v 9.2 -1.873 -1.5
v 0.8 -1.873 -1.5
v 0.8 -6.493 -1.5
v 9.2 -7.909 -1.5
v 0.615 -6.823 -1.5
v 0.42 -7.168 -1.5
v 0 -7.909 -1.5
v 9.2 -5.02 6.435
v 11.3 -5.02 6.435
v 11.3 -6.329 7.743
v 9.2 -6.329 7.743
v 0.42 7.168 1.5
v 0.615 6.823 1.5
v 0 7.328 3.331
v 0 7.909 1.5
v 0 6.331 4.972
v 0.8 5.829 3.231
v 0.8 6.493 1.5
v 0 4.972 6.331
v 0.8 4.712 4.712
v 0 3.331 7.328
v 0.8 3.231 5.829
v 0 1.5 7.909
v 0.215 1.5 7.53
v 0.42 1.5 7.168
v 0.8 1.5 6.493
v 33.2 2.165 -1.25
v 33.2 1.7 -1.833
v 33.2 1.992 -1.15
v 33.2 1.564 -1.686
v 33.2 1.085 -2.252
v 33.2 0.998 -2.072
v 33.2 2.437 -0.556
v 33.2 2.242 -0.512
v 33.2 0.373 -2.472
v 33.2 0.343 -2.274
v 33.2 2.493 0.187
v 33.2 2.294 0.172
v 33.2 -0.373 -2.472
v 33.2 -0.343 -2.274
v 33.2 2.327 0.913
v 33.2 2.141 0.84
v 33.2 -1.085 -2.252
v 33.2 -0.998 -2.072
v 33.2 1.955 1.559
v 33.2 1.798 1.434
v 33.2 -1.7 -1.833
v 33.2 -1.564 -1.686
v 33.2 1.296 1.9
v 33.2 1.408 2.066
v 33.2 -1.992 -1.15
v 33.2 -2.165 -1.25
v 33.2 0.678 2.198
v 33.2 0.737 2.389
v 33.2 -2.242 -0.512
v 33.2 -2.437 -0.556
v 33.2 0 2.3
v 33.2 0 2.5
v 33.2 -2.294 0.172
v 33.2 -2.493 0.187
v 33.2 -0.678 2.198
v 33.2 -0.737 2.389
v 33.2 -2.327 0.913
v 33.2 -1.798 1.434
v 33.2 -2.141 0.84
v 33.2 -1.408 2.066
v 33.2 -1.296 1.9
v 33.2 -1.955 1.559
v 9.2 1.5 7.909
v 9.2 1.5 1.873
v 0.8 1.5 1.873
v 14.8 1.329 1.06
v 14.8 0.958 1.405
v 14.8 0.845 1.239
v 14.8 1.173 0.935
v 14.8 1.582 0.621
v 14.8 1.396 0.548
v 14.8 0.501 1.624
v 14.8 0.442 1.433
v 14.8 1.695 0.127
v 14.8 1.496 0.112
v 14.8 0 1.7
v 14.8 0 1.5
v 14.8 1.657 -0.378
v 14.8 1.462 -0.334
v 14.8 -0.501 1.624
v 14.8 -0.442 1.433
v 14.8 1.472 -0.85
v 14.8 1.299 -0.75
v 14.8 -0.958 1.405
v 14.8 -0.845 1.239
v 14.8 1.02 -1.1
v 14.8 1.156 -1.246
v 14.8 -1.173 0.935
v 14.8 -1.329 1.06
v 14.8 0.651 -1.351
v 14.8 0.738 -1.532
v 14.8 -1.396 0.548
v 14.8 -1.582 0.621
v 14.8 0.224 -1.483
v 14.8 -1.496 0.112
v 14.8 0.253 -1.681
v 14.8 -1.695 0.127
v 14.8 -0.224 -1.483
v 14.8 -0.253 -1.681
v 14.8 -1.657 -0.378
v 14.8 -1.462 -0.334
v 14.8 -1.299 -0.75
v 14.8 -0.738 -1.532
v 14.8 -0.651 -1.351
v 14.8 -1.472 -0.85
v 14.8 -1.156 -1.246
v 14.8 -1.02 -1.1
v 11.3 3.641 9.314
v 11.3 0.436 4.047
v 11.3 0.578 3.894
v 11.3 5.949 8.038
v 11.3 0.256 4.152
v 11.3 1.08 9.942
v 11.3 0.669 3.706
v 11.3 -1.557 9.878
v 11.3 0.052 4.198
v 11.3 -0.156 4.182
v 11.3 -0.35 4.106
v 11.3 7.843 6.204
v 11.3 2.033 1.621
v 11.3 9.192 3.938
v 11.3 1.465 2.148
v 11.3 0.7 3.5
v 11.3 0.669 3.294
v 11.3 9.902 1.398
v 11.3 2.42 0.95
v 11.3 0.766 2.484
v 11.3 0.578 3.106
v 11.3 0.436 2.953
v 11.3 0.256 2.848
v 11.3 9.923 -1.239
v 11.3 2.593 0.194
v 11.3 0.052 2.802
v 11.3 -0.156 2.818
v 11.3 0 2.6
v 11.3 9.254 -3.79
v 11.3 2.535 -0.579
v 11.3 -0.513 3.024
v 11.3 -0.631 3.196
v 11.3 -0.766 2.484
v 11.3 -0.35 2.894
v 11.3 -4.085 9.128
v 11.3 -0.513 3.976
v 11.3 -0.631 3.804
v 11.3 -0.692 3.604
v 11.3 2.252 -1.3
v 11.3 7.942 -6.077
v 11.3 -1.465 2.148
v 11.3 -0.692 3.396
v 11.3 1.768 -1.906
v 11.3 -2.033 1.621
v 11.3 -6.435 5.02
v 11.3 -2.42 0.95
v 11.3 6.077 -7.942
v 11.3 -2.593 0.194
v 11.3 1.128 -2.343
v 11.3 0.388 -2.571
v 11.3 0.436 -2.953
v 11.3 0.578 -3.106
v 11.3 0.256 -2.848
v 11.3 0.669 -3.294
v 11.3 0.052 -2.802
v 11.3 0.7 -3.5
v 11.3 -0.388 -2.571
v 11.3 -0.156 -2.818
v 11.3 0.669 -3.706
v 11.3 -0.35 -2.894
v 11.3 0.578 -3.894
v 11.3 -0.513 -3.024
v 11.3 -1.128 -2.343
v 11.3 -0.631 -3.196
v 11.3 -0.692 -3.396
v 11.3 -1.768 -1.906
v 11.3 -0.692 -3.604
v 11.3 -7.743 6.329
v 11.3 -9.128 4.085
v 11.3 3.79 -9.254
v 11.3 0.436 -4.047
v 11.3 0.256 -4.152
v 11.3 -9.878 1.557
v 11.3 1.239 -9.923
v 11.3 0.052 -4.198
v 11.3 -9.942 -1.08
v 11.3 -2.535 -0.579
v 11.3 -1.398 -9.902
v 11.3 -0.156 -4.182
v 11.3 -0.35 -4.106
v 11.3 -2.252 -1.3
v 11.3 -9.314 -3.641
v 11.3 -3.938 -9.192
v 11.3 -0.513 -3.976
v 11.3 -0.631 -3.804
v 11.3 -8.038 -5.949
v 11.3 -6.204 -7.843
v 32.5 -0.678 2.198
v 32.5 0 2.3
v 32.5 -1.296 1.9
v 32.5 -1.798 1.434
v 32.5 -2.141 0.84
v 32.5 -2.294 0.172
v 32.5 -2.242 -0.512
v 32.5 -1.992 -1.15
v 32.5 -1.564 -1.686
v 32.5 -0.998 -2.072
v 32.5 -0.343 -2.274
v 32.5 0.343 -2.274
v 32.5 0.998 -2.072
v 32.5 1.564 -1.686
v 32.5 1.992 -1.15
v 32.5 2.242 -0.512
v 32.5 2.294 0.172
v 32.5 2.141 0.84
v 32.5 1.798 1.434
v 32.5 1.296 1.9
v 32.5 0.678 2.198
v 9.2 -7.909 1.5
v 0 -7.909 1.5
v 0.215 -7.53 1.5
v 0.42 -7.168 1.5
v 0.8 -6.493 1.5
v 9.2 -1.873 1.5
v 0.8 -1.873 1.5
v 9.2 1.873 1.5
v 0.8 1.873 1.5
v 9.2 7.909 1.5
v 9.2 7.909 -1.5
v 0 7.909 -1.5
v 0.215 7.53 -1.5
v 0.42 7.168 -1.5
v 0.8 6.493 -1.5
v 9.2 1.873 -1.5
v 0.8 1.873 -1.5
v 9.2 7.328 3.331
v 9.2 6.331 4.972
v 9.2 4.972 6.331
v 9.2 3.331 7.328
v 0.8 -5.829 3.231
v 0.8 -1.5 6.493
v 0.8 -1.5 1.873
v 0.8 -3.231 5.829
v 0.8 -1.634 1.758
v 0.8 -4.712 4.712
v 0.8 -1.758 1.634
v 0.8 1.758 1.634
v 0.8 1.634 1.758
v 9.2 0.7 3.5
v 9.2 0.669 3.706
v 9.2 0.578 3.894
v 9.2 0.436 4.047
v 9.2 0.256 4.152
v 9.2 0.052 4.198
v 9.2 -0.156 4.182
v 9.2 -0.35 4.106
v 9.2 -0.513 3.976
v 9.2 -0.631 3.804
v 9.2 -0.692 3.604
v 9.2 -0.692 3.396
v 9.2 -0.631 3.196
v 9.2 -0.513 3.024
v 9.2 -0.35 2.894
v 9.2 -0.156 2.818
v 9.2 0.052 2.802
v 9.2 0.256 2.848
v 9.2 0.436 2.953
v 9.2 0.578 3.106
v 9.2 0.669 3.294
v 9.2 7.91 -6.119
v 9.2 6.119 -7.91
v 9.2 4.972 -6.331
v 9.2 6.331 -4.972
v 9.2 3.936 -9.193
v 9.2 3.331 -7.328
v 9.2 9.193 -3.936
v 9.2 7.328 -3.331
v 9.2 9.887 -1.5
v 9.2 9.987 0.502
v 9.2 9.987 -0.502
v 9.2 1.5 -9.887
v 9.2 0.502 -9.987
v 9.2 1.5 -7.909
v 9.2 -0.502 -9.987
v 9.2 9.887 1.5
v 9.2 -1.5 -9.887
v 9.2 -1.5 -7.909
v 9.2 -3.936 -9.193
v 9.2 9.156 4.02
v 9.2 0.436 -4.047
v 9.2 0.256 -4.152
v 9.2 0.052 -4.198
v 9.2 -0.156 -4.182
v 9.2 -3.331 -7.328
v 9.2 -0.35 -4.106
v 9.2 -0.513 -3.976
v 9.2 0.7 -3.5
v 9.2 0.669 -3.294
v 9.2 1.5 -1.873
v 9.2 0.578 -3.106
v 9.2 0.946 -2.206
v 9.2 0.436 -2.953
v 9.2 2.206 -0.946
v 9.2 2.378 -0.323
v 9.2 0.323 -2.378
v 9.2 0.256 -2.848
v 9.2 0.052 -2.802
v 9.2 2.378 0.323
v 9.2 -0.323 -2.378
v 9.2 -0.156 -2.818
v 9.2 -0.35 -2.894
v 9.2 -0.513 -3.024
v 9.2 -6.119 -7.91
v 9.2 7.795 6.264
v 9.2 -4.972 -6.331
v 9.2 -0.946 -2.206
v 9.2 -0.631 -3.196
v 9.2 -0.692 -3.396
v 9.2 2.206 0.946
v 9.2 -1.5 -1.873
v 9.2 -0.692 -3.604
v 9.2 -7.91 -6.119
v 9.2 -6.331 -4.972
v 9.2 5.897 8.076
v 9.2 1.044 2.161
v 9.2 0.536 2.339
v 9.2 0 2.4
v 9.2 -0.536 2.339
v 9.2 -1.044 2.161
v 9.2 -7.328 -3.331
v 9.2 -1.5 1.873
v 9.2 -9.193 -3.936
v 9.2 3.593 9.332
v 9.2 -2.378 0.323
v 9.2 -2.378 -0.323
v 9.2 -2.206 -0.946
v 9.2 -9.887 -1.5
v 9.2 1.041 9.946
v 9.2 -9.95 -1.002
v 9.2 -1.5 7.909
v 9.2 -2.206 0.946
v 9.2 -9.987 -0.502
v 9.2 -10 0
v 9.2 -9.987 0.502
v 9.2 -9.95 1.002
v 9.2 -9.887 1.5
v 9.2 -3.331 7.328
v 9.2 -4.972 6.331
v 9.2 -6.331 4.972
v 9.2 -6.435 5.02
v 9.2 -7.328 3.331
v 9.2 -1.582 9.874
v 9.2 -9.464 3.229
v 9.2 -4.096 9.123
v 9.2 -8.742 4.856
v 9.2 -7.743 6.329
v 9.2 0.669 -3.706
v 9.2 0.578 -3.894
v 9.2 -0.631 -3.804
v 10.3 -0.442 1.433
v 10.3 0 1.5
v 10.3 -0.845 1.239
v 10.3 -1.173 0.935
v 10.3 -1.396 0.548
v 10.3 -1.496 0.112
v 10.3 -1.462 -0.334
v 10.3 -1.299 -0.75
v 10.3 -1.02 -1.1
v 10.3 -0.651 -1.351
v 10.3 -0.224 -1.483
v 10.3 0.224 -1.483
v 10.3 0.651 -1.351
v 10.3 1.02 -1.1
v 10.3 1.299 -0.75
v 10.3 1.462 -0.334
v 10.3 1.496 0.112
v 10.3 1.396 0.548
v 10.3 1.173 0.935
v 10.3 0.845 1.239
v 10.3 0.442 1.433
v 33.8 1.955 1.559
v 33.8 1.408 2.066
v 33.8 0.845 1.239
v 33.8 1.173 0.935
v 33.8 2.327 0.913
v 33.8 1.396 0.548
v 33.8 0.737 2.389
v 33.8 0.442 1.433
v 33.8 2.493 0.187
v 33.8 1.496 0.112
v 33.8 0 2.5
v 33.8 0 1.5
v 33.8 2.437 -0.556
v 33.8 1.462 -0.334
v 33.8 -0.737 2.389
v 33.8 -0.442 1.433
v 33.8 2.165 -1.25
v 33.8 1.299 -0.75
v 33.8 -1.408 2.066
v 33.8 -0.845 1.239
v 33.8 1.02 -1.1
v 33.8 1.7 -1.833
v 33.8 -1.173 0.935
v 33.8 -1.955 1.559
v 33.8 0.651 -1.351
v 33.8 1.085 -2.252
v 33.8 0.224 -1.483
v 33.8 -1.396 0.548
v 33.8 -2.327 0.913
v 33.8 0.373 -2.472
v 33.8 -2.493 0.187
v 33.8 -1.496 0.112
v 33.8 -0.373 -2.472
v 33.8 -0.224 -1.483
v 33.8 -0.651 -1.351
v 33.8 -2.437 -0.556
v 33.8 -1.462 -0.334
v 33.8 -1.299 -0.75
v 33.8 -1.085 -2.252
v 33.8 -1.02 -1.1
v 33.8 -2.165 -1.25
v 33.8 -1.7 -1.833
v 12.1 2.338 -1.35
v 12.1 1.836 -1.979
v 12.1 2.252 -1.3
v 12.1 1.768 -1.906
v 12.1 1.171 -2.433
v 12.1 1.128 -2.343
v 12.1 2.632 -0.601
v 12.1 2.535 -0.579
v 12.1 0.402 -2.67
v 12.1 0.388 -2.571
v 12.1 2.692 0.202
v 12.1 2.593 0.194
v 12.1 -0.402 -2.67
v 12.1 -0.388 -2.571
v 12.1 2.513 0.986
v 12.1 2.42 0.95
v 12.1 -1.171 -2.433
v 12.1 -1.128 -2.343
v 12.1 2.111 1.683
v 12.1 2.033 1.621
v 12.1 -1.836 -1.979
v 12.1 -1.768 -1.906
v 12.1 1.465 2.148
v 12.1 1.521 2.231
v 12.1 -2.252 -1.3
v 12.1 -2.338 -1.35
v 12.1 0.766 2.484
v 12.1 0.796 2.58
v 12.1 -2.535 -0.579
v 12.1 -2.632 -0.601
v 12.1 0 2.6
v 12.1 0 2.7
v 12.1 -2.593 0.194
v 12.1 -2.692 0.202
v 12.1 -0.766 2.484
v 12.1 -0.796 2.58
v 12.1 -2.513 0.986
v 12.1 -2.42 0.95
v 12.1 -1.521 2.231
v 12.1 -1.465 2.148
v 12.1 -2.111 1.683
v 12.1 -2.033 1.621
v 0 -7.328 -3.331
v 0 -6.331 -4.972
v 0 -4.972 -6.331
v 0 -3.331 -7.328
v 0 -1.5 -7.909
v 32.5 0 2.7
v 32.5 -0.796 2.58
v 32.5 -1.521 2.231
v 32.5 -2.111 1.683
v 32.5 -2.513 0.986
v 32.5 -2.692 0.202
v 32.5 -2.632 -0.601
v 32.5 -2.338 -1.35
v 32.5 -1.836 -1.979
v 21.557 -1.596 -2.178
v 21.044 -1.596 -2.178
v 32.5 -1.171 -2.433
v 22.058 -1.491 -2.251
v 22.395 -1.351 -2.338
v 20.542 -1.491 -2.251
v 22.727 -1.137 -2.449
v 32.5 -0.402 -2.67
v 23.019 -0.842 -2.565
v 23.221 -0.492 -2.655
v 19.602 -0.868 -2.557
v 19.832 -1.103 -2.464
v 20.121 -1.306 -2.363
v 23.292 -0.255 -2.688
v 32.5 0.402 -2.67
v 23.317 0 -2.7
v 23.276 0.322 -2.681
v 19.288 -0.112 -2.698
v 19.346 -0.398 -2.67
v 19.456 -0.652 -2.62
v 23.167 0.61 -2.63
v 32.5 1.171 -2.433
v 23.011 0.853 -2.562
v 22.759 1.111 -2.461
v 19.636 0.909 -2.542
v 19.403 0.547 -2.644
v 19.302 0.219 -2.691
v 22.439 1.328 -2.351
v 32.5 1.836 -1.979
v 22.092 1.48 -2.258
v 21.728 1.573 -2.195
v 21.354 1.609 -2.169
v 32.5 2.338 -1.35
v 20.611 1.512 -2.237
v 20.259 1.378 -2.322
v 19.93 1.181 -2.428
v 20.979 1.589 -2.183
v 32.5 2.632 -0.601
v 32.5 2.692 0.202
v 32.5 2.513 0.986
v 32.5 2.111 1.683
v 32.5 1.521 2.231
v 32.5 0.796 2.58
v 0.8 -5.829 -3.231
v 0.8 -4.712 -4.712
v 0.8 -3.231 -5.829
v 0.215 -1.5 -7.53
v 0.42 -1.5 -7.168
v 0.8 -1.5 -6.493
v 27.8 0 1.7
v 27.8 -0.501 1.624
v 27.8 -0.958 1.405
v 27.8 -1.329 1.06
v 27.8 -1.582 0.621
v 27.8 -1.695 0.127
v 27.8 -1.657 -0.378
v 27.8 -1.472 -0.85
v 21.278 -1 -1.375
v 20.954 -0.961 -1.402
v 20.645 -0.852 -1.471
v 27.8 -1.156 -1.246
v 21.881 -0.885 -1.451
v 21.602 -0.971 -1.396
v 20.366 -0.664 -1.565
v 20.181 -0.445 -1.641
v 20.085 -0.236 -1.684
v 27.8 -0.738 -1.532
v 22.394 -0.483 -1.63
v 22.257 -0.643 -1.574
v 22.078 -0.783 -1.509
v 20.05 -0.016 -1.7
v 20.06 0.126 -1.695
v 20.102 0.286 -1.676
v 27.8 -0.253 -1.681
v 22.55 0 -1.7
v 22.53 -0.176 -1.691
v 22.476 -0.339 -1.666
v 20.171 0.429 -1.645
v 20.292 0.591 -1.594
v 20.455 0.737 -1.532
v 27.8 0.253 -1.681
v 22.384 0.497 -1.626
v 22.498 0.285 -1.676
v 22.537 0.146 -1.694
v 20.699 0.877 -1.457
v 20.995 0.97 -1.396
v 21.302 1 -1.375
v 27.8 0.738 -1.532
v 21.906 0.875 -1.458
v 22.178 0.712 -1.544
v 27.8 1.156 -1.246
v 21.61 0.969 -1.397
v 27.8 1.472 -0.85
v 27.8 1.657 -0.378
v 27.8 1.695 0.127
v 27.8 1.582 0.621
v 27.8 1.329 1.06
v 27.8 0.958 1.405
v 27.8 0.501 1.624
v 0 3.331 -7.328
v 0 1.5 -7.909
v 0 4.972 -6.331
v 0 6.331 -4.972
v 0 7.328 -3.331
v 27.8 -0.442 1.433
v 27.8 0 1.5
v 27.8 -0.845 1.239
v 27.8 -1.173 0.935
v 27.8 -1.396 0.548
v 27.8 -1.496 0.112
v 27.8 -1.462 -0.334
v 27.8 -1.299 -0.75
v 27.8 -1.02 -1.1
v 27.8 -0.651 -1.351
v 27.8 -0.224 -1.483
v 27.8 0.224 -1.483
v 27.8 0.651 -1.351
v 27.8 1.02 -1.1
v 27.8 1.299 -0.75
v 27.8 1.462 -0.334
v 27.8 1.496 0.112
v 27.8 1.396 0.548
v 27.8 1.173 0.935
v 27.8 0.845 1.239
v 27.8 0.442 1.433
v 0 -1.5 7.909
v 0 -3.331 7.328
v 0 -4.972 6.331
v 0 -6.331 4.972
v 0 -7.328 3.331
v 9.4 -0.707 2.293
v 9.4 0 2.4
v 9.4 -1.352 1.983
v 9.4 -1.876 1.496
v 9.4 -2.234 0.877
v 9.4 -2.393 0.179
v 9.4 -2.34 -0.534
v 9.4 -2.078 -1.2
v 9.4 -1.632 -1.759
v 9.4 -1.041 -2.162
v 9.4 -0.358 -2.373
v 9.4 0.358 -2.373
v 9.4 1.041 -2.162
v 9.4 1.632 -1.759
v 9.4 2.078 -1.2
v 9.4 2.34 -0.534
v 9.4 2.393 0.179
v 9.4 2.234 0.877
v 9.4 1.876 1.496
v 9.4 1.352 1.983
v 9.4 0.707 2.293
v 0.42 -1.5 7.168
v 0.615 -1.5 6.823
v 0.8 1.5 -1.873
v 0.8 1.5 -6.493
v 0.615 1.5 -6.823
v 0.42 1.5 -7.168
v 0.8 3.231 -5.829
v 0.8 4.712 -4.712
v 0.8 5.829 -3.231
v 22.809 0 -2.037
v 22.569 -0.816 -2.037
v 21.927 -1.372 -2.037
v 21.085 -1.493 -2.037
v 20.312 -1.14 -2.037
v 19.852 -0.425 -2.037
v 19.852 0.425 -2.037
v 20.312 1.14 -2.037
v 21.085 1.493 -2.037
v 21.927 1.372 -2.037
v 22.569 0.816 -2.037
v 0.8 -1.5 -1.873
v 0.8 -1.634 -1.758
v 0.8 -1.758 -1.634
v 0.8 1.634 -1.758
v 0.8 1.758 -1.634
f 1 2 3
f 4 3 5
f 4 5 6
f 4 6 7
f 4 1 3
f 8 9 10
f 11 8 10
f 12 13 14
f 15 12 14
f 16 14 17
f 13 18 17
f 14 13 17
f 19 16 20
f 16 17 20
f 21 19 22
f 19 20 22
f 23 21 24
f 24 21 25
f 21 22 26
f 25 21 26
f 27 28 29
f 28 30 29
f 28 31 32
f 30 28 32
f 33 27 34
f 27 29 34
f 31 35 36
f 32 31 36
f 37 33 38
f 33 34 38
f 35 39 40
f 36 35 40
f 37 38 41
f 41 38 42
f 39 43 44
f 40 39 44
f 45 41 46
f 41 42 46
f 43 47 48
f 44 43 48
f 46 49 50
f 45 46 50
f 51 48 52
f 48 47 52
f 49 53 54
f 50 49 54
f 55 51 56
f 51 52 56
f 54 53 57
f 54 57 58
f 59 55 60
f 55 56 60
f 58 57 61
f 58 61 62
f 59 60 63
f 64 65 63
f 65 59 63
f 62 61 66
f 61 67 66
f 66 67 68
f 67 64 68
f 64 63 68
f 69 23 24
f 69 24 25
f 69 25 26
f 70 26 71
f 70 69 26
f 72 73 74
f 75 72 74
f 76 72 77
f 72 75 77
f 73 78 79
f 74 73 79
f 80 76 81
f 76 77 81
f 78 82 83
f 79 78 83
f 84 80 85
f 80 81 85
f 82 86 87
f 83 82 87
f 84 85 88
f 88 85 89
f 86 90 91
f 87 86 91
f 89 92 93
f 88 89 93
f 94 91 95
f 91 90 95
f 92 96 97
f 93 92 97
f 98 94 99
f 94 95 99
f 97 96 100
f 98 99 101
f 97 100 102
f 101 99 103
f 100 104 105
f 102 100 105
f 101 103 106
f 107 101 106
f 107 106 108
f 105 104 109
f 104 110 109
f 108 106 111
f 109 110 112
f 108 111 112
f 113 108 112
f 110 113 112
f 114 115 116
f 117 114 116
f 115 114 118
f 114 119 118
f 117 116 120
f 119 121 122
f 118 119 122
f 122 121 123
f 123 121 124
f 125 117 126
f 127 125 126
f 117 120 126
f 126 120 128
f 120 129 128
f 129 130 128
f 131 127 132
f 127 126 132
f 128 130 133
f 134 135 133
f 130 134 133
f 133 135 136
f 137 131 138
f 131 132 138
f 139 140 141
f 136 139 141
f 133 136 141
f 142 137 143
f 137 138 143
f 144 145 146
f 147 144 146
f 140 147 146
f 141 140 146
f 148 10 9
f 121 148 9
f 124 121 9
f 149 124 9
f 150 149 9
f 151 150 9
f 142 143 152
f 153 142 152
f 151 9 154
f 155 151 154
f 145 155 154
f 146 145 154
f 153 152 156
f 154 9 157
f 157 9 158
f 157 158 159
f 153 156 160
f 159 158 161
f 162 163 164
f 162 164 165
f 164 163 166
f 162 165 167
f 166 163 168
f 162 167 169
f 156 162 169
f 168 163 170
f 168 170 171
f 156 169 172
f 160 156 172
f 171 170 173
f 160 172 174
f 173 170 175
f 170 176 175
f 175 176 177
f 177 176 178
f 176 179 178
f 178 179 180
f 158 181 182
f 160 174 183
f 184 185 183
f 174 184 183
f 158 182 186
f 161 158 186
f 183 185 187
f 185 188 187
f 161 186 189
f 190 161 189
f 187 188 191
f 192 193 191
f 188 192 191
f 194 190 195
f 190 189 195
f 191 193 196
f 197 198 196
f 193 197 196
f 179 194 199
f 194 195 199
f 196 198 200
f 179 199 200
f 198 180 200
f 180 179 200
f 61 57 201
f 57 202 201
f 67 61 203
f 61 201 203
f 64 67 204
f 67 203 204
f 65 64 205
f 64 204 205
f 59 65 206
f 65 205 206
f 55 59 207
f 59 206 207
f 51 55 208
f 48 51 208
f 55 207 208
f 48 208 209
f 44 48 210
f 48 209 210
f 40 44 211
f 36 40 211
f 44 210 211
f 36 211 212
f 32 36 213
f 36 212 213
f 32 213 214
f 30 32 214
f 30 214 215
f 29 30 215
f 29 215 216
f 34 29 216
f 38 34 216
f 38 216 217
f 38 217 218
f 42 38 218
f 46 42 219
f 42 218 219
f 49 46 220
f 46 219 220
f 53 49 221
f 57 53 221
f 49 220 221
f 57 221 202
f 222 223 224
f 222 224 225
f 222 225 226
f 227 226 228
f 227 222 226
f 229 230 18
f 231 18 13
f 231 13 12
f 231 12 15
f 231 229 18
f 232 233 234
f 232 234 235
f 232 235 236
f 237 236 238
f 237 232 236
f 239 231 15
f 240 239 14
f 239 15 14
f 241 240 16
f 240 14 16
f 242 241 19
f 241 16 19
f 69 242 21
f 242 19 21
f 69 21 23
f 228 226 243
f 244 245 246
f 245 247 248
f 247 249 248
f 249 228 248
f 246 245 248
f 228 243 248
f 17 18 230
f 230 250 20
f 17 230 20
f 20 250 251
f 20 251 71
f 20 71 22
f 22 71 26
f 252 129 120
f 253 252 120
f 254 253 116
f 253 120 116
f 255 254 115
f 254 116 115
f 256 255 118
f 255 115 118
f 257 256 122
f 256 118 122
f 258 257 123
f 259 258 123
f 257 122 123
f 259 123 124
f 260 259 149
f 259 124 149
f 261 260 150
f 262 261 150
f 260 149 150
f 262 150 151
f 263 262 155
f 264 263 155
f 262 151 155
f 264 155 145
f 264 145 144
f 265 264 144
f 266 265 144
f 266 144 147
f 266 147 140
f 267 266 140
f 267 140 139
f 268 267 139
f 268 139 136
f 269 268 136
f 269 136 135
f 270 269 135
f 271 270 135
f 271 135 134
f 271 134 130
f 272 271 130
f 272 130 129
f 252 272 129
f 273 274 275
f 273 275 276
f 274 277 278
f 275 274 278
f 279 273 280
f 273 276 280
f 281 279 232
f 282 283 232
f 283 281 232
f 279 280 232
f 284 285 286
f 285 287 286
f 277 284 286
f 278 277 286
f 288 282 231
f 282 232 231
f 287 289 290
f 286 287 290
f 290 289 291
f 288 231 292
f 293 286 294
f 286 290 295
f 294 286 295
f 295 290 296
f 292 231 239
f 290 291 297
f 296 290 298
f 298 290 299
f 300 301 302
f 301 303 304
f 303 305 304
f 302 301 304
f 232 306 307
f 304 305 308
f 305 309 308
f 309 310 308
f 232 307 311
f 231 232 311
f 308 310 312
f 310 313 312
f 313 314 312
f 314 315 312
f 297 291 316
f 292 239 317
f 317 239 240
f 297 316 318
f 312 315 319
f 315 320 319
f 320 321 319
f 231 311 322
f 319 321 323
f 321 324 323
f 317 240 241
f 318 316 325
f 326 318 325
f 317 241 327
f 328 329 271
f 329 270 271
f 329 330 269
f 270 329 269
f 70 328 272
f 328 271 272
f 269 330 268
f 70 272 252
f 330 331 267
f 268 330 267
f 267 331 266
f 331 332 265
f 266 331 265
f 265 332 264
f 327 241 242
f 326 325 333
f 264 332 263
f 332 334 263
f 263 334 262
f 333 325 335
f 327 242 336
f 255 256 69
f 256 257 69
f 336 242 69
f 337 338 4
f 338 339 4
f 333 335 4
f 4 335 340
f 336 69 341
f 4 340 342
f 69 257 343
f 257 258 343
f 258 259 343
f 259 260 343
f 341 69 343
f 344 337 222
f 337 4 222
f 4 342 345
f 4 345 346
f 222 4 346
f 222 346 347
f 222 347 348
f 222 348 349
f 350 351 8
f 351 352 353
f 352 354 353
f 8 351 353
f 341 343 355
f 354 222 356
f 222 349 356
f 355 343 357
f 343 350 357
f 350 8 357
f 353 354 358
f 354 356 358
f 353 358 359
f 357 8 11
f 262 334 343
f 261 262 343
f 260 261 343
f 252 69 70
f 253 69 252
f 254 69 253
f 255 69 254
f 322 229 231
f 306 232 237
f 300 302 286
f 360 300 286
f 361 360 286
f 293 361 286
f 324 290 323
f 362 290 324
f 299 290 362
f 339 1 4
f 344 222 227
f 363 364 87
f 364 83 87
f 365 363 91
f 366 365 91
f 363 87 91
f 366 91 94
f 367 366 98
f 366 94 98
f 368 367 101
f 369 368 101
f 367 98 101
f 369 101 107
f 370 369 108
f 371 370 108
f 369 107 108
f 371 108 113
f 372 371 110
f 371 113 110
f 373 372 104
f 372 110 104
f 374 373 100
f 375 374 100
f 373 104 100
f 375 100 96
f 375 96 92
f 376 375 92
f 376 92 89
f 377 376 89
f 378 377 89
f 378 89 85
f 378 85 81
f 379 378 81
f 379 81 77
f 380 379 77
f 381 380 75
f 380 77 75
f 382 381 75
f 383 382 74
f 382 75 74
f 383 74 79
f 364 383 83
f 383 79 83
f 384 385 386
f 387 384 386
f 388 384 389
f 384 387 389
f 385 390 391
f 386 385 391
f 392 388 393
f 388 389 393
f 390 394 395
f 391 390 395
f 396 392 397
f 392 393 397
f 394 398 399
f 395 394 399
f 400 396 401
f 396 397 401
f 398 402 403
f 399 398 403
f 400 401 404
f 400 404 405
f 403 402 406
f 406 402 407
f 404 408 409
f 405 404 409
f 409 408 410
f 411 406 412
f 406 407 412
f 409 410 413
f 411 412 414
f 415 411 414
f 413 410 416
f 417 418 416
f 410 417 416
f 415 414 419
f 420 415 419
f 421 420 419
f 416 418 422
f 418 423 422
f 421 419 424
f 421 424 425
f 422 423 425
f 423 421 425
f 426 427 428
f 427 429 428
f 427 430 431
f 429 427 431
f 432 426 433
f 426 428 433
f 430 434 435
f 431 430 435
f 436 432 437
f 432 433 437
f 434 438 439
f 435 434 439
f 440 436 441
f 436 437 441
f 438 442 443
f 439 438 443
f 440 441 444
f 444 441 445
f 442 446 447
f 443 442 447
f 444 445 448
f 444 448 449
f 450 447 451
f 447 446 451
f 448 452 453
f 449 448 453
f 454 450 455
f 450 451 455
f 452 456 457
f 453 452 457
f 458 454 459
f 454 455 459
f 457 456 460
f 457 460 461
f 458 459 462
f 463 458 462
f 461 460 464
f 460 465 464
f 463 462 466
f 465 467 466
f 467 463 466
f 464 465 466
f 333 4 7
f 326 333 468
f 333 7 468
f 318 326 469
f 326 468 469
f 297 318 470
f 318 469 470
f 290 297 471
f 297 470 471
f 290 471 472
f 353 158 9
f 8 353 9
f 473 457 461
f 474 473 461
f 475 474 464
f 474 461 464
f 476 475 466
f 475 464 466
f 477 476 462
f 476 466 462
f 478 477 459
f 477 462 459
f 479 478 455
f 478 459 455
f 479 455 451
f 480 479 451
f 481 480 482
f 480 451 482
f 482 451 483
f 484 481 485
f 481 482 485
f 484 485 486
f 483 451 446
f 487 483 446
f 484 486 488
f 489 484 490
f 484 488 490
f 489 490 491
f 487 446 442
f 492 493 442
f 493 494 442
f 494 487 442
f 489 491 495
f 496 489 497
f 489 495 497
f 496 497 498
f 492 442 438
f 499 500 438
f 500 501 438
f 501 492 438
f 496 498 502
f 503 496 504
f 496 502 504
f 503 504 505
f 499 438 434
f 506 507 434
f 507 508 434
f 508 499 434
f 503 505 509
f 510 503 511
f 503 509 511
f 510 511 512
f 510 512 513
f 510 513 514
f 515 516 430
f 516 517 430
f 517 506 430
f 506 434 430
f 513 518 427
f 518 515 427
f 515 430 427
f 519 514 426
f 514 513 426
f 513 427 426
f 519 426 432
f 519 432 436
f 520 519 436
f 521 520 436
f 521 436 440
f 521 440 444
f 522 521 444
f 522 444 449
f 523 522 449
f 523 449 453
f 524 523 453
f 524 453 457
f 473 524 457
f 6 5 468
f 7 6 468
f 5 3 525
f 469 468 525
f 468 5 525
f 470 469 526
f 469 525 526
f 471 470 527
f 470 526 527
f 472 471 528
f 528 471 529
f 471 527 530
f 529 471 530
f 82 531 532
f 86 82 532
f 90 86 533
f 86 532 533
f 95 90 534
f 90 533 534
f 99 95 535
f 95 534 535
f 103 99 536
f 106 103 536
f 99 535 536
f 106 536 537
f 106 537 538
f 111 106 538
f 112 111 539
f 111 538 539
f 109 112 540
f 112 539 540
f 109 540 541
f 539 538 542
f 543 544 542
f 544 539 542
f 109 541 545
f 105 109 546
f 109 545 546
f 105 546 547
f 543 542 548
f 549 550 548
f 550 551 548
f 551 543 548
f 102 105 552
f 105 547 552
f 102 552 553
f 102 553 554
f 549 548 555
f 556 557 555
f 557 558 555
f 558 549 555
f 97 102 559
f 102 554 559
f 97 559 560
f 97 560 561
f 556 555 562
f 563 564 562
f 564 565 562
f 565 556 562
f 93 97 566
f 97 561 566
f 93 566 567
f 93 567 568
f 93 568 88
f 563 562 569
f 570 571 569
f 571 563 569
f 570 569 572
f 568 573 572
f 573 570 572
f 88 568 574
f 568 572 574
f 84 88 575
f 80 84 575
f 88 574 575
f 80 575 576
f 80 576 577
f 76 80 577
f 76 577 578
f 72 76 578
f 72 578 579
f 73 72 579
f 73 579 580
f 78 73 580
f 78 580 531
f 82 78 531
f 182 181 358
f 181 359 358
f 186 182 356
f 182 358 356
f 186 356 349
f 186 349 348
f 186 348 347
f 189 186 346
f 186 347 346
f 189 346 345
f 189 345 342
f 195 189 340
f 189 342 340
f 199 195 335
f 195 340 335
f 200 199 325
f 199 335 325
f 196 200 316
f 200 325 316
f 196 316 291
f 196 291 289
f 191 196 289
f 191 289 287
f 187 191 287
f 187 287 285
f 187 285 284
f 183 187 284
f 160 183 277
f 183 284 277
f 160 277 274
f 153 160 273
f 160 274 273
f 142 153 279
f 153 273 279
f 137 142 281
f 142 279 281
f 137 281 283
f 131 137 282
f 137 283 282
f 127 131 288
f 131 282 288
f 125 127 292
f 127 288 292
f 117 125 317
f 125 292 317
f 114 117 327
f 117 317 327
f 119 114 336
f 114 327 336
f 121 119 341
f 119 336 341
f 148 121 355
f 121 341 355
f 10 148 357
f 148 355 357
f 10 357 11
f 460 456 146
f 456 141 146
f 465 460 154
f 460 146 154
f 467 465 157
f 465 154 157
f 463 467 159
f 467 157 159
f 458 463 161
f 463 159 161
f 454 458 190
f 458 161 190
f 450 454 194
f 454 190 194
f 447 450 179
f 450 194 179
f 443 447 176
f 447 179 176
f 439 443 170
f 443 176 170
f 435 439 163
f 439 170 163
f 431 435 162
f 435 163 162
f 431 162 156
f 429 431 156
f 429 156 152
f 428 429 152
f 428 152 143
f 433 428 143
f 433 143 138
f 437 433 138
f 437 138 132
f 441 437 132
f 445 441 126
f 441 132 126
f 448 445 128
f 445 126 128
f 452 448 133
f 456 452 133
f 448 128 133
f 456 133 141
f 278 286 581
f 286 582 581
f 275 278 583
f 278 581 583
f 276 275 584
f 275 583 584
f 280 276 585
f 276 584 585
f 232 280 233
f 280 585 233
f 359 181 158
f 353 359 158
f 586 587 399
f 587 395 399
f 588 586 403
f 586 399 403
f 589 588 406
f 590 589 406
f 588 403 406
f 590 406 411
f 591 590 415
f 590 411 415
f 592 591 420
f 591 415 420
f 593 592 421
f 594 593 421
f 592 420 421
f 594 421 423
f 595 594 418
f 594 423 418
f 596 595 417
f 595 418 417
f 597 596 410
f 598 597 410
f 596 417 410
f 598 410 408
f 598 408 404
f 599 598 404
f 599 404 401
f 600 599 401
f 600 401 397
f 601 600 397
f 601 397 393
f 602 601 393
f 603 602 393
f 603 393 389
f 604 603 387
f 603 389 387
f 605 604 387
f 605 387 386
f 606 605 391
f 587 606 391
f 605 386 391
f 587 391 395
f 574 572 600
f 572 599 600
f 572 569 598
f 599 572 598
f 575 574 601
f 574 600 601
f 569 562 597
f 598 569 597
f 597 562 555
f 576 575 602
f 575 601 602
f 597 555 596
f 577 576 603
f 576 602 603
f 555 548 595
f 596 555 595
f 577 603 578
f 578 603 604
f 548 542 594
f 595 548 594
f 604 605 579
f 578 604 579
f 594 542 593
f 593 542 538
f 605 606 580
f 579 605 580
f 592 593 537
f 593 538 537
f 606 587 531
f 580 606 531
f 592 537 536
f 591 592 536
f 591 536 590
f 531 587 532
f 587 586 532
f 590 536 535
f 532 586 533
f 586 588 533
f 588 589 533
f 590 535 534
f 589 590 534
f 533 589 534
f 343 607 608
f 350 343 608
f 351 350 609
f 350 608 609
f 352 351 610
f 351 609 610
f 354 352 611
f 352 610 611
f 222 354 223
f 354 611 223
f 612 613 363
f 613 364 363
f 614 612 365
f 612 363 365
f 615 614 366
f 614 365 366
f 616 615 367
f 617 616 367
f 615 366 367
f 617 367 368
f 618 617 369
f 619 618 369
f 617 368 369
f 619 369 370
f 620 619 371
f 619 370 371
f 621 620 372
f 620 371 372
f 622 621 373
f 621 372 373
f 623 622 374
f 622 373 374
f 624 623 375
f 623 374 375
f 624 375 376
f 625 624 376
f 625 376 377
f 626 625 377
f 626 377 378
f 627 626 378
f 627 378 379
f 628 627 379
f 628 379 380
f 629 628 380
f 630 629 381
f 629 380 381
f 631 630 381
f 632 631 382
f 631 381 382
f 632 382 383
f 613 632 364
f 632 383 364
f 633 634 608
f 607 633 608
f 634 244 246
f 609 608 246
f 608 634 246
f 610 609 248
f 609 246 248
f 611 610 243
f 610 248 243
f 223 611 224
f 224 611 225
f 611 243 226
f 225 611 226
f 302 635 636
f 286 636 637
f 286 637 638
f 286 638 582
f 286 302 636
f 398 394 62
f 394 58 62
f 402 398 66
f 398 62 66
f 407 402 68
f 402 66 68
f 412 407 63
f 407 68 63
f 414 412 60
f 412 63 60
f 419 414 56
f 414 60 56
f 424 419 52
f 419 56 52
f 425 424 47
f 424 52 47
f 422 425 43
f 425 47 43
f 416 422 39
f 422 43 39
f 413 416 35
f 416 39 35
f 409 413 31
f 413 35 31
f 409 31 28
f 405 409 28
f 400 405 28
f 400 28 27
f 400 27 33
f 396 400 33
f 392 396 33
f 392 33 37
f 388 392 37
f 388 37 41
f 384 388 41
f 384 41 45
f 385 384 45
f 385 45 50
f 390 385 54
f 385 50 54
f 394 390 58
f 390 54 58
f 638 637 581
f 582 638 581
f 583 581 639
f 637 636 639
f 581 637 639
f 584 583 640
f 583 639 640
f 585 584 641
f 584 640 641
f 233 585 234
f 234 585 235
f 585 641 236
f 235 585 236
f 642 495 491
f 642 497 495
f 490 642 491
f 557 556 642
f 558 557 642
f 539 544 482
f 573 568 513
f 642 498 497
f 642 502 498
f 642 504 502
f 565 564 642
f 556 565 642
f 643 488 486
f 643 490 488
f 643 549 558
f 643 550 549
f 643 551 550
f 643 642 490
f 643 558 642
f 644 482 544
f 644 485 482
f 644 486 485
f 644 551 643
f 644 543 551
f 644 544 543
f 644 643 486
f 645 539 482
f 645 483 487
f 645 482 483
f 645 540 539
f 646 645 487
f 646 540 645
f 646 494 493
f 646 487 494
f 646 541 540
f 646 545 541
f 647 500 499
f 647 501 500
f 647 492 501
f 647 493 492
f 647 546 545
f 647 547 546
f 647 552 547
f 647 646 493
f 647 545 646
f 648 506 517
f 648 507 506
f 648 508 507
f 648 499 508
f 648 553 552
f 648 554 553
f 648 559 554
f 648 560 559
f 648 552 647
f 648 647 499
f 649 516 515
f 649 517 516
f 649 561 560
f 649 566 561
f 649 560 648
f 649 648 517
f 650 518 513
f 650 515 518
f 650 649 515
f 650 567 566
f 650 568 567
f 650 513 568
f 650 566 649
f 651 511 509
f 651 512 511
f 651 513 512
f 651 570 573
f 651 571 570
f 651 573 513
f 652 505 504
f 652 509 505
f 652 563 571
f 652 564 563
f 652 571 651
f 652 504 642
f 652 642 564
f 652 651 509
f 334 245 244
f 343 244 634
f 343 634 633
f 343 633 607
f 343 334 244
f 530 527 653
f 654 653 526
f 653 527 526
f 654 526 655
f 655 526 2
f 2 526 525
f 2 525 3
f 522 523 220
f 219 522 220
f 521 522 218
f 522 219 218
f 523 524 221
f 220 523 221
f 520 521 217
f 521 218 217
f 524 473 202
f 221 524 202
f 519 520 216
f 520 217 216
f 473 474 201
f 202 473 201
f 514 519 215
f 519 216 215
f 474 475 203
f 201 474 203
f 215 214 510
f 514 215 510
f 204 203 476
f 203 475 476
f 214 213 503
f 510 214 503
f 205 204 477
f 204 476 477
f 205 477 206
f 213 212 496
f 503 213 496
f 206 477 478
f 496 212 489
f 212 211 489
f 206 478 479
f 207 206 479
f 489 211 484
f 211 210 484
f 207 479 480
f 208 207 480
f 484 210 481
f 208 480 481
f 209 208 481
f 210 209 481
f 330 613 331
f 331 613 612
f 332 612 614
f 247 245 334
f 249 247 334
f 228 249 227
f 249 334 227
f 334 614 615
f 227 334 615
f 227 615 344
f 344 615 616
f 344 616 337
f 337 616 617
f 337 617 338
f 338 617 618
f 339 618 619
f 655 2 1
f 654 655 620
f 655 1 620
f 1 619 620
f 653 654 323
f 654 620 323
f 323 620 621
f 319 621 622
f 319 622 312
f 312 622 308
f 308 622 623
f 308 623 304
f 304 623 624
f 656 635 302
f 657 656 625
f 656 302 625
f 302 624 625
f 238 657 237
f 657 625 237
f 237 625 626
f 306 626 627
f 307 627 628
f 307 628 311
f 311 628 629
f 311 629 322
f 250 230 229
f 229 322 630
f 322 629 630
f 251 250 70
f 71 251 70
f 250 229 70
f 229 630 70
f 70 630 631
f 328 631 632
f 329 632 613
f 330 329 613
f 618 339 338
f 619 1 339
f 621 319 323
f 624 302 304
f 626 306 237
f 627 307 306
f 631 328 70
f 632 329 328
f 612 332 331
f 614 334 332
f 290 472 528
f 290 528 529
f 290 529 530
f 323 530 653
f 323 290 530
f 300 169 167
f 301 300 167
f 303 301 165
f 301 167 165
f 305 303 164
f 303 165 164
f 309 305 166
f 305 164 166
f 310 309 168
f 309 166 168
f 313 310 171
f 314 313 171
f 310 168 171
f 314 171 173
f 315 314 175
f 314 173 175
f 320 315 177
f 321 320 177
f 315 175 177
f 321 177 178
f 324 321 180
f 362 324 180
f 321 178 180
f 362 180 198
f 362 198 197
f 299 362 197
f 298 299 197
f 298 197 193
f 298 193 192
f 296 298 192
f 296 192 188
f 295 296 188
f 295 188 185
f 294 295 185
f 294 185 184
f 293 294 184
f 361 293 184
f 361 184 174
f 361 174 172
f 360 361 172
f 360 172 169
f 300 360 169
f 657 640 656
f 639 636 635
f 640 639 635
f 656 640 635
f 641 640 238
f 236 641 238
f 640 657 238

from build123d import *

# Parameters (mm, degrees)
F2_W     = 3
F2_H     = 3
F3_DEPTH = 9.201
F4_R     = 0.7
F5_DEPTH = 11.301


with BuildPart() as f1:
    # F0 (on Front) → F1 (revolve)
    with BuildSketch(Plane.XZ):
        Polygon((9.2, 8.05), (0, 8.05), (0.8, 6.6643593539), (0.8, 2.4), (9.4, 2.4), (10.3, 1.5), (14.8, 1.5), (14.8, 1.7), (27.8, 1.7), (27.8, 1.5), (33.8, 1.5), (33.8, 2.5), (33.2, 2.5), (33.2, 2.3), (32.5, 2.3), (32.5, 2.7), (12.1, 2.7), (12.1, 2.6), (11.3, 2.6), (11.3, 10), (9.2, 10), align=None)
    revolve(axis=Axis((16.7398190946, 0, 0), (1, 0, 0)))

    # F2 (on face) → F3 (cut, through all)
    with BuildSketch(Plane(origin=(9.2, 0, 0), x_dir=(0, -1, 0), z_dir=(-1, 0, 0))):
        with BuildLine():
            Line((1.5, 1.5), (1.5, 7.909013845))
            ThreePointArc((1.5, 7.909013845), (0, 8.05), (-1.5, 7.909013845))
            Line((-1.5, 7.909013845), (-1.5, 1.5))
            Line((-1.5, 1.5), (1.5, 1.5))
        make_face()
        with BuildLine():
            Line((1.5, 7.909013845), (1.5, 9.8868599666))
            ThreePointArc((1.5, 9.8868599666), (0, 10), (-1.5, 9.8868599666))
            Line((-1.5, 9.8868599666), (-1.5, 7.909013845))
            ThreePointArc((-1.5, 7.909013845), (0, 8.05), (1.5, 7.909013845))
        make_face()
        with BuildLine():
            Line((-1.5, -1.5), (-1.5, 1.5))
            Line((-1.5, 1.5), (-7.909013845, 1.5))
            ThreePointArc((-7.909013845, 1.5), (-8.05, 0), (-7.909013845, -1.5))
            Line((-7.909013845, -1.5), (-1.5, -1.5))
        make_face()
        with BuildLine():
            Line((-7.909013845, 1.5), (-9.8868599666, 1.5))
            ThreePointArc((-9.8868599666, 1.5), (-10, 0), (-9.8868599666, -1.5))
            Line((-9.8868599666, -1.5), (-7.909013845, -1.5))
            ThreePointArc((-7.909013845, -1.5), (-8.05, 0), (-7.909013845, 1.5))
        make_face()
        Rectangle(F2_W, F2_H)
        with BuildLine():
            ThreePointArc((8.05, 0), (8.0146759589, 0.7533055648), (7.909013845, 1.5))
            Line((7.909013845, 1.5), (1.5, 1.5))
            Line((1.5, 1.5), (1.5, -1.5))
            Line((1.5, -1.5), (7.909013845, -1.5))
            ThreePointArc((7.909013845, -1.5), (8.0146759589, -0.7533055648), (8.05, 0))
        make_face()
        with BuildLine():
            ThreePointArc((9.8868599666, -1.5), (9.971674876, -0.7521304187), (10, 0))
            ThreePointArc((10, 0), (9.971674876, 0.7521304187), (9.8868599666, 1.5))
            Line((9.8868599666, 1.5), (7.909013845, 1.5))
            ThreePointArc((7.909013845, 1.5), (8.0146759589, 0.7533055648), (8.05, 0))
            ThreePointArc((8.05, 0), (8.0146759589, -0.7533055648), (7.909013845, -1.5))
            Line((7.909013845, -1.5), (9.8868599666, -1.5))
        make_face()
        with BuildLine():
            ThreePointArc((-1.5, -7.909013845), (0, -8.05), (1.5, -7.909013845))
            Line((1.5, -7.909013845), (1.5, -1.5))
            Line((1.5, -1.5), (-1.5, -1.5))
            Line((-1.5, -1.5), (-1.5, -7.909013845))
        make_face()
        with BuildLine():
            ThreePointArc((-1.5, -9.8868599666), (0, -10), (1.5, -9.8868599666))
            Line((1.5, -9.8868599666), (1.5, -7.909013845))
            ThreePointArc((1.5, -7.909013845), (0, -8.05), (-1.5, -7.909013845))
            Line((-1.5, -7.909013845), (-1.5, -9.8868599666))
        make_face()
    extrude(amount=F3_DEPTH, mode=Mode.SUBTRACT)

    # F4 (on face) → F5 (cut, through all)
    with BuildSketch(Plane.YZ.offset(11.3)):
        with BuildLine():
            Line((-5.0204581464, 6.4346717088), (-6.3285168585, 7.7427304209))
            ThreePointArc((-6.3285168585, 7.7427304209), (-7.0710678119, 7.0710678119), (-7.7427304209, 6.3285168585))
            Line((-7.7427304209, 6.3285168585), (-6.4346717088, 5.0204581464))
            Line((-6.4346717088, 5.0204581464), (-5.0204581464, 6.4346717088))
        make_face()
        with Locations((0, 3.5)):
            Circle(F4_R)
        with Locations((0, -3.5)):
            Circle(F4_R)
    extrude(amount=-F5_DEPTH, mode=Mode.SUBTRACT)

    # F0 (on Front) → F6 (revolve, cut)
    with BuildSketch(Plane.XZ):
        Polygon((25.1366349399, -5.0709682839), (21.3, -0.0709682839), (21.3, -5.0709682839), align=None)
    revolve(axis=Axis((21.3, 0, -2.5709682839), (0, 0, -1)), mode=Mode.SUBTRACT)


solid = f1.part
